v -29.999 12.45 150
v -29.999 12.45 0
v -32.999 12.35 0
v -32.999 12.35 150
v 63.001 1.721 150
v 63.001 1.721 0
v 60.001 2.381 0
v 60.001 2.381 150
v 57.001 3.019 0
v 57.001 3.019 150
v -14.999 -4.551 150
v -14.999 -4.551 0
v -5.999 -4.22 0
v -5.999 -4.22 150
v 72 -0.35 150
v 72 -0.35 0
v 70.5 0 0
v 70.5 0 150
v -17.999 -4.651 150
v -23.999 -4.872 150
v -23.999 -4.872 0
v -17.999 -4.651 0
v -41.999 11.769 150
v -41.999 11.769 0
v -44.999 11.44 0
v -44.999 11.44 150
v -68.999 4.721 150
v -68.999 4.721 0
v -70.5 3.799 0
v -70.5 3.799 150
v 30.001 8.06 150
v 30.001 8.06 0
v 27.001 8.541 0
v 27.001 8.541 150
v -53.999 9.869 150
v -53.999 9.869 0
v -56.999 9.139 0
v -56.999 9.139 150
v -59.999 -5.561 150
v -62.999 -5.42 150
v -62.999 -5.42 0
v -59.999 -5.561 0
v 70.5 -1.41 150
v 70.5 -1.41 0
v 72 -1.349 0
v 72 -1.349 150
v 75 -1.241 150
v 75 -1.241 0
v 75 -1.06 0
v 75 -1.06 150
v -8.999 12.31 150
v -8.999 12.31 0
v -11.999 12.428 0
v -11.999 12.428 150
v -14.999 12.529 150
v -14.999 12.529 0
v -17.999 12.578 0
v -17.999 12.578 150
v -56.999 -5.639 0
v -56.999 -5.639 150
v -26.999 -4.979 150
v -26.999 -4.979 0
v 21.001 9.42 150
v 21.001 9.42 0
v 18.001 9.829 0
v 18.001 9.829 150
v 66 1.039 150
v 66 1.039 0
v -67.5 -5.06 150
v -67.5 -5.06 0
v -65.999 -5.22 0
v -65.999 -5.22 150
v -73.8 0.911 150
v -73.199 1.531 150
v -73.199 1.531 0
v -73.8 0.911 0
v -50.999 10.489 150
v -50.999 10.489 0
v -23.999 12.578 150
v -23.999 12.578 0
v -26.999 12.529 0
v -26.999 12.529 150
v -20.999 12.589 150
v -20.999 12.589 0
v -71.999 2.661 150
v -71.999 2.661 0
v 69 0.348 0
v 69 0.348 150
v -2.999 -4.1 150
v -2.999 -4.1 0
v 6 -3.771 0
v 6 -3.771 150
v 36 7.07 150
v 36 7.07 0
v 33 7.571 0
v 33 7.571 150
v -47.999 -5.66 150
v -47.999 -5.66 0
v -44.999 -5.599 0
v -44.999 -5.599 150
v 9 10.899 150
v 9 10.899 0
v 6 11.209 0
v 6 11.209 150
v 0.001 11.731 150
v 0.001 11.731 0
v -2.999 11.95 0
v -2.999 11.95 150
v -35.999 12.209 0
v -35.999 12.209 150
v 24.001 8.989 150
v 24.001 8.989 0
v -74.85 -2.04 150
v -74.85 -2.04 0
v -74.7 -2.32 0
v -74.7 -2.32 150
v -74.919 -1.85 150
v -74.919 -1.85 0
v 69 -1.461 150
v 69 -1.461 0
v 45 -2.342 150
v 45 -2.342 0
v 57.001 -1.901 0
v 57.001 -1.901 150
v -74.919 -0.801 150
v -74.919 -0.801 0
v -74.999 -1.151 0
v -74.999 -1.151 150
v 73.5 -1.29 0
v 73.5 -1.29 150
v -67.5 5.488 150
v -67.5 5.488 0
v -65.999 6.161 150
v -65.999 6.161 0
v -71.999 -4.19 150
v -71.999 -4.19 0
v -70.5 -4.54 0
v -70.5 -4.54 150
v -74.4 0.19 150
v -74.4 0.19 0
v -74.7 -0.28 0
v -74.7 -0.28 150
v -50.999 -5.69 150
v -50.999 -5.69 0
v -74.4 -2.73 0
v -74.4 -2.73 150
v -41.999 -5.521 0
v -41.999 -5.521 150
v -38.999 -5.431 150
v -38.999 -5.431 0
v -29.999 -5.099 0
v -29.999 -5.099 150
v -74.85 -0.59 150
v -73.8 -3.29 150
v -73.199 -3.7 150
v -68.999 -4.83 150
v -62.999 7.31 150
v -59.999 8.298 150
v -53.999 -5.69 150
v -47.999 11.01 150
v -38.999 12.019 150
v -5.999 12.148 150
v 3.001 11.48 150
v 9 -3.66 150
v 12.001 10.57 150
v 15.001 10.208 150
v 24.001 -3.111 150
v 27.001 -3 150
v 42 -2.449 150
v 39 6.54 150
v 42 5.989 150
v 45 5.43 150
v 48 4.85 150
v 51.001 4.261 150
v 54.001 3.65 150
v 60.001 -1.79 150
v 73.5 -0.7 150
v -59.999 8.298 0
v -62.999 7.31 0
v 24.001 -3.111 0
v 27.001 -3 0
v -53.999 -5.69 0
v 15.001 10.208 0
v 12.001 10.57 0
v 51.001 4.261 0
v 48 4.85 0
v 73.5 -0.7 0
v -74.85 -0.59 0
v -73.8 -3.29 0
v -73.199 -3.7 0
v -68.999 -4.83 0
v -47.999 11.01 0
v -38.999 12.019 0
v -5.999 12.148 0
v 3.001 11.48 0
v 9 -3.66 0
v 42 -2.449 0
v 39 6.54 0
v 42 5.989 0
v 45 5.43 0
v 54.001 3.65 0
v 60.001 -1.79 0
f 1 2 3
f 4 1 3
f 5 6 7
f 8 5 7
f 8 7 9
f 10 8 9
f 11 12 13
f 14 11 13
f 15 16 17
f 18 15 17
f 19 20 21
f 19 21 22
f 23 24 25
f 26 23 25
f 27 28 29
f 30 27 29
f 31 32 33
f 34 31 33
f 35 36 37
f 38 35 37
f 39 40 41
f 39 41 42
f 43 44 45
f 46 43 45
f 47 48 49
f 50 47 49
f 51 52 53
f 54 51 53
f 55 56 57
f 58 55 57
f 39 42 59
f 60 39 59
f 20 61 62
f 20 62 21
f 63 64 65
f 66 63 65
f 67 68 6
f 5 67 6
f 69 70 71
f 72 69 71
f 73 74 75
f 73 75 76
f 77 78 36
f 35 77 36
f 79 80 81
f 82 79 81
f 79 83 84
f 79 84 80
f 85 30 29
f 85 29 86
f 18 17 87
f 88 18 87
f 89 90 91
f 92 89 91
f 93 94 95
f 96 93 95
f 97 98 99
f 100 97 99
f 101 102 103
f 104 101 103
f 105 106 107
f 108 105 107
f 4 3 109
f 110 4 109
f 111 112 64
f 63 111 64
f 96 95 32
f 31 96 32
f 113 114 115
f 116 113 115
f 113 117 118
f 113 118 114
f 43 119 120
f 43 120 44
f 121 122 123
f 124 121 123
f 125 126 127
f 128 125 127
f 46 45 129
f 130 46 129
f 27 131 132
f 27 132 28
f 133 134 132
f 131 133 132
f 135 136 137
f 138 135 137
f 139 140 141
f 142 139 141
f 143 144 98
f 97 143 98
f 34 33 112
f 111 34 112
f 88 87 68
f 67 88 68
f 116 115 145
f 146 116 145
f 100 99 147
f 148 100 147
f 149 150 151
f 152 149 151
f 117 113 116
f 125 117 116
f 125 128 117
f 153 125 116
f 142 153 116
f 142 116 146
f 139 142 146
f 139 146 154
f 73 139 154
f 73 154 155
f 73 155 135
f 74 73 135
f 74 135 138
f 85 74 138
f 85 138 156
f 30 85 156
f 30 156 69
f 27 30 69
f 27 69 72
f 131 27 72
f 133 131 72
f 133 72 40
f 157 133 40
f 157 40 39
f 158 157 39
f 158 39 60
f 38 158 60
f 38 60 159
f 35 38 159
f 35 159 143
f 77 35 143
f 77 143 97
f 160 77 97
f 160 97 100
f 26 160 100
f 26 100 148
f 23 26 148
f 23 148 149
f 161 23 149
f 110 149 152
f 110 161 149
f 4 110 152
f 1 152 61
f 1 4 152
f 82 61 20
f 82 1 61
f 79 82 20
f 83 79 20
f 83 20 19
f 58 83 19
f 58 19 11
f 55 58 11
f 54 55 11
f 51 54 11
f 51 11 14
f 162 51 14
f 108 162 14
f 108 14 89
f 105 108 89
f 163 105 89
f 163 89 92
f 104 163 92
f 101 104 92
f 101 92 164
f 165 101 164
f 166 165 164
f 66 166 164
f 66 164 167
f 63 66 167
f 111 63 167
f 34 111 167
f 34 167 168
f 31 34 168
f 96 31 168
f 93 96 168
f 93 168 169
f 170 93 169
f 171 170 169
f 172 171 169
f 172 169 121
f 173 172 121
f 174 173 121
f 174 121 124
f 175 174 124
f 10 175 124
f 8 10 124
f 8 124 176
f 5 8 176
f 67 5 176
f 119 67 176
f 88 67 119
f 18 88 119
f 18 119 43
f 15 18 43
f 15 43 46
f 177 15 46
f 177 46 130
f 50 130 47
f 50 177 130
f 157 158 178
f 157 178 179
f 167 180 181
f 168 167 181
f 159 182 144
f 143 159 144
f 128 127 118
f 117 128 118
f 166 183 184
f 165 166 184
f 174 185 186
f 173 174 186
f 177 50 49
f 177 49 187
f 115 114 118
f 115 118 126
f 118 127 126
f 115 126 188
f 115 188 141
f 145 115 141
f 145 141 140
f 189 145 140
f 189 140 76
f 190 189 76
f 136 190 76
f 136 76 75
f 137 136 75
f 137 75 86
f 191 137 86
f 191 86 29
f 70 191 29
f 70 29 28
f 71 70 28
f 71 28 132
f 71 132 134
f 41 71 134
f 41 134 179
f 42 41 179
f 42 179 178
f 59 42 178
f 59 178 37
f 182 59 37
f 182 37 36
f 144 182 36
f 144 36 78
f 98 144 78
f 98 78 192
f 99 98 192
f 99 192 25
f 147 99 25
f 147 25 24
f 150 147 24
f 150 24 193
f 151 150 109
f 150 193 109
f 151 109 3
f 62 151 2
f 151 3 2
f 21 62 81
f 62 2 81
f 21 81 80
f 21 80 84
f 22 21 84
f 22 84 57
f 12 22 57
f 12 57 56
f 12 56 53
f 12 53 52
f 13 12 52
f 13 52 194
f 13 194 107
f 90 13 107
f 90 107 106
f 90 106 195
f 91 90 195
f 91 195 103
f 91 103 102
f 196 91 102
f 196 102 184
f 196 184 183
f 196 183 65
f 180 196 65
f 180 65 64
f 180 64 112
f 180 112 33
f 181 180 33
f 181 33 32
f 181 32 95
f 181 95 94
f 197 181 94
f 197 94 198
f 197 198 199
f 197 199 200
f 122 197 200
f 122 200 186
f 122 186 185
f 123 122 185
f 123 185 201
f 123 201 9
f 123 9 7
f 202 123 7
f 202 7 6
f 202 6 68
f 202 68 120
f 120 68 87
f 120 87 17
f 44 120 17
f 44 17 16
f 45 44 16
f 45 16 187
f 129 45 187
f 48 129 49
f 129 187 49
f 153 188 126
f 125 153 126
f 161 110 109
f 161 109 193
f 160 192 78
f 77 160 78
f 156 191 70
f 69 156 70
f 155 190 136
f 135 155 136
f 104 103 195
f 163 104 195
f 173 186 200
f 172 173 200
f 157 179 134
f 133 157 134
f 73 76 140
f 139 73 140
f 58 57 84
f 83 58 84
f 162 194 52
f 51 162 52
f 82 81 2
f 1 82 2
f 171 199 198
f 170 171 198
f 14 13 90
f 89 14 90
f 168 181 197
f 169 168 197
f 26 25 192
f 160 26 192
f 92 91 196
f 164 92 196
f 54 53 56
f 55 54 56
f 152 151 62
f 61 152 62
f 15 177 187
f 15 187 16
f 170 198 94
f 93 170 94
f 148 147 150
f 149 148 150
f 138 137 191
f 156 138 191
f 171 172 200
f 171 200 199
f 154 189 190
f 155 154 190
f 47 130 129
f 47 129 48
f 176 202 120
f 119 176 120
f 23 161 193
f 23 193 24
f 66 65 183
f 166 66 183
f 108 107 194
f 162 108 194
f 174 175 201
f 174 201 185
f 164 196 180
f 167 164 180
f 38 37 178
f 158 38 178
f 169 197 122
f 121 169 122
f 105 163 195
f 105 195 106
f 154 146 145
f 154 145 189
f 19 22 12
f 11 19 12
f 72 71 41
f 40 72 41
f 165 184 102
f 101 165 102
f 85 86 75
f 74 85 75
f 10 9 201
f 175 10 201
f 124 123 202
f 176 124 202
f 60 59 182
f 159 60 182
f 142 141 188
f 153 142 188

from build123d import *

# Parameters (mm, degrees)
F1_DEPTH = 150


with BuildPart() as f1:
    # F0 (on Top) → F1 (new body)
    with BuildSketch(Plane.XY):
        Polygon((75.000358, -1.240587), (75.000358, -1.060069), (73.499726, -0.700405), (72.000364, -0.350393), (70.499732, -0.000356), (69.00037, 0.348285), (66.000376, 1.038682), (63.000636, 1.720825), (60.000642, 2.380894), (57.000648, 3.018917), (54.000654, 3.650082), (51.00066, 4.26052), (48.000412, 4.850333), (45.000418, 5.430495), (42.000424, 5.988609), (39.00043, 6.539814), (36.000436, 7.070369), (33.000442, 7.570597), (30.000702, 8.059801), (27.000708, 8.540775), (24.000714, 8.988577), (21.00072, 9.419869), (18.000726, 9.829317), (15.000732, 10.208031), (12.000738, 10.570489), (9.00049, 10.898657), (6.000496, 11.208537), (3.000502, 11.480063), (0.000508, 11.730761), (-2.999232, 11.949963), (-5.999226, 12.148337), (-8.99922, 12.309627), (-11.999214, 12.428245), (-14.999208, 12.528829), (-17.999202, 12.578359), (-20.999196, 12.589281), (-23.99919, 12.578359), (-26.999438, 12.528829), (-29.999432, 12.450343), (-32.998918, 12.349505), (-35.999166, 12.209043), (-38.99916, 12.018797), (-41.999154, 11.769369), (-44.999148, 11.440185), (-47.999142, 11.010163), (-50.999136, 10.489209), (-53.99913, 9.869195), (-56.999099, 9.138691), (-59.999118, 8.298205), (-62.999087, 7.310145), (-65.999081, 6.160872), (-67.499763, 5.488381), (-68.999075, 4.720793), (-70.499757, 3.798875), (-71.999069, 2.66065), (-73.19932, 1.530655), (-73.800132, 0.910514), (-74.399597, 0.18984), (-74.700003, -0.280111), (-74.850219, -0.590169), (-74.919103, -0.800989), (-74.999037, -1.151001), (-74.919103, -1.849679), (-74.850219, -2.039823), (-74.700003, -2.319579), (-74.399597, -2.730246), (-73.800132, -3.289732), (-73.19932, -3.700399), (-71.999069, -4.189603), (-70.499757, -4.539615), (-68.999075, -4.830369), (-67.499763, -5.060493), (-65.999081, -5.220386), (-62.999087, -5.420182), (-59.999118, -5.56072), (-56.999099, -5.639308), (-53.99913, -5.69026), (-50.999136, -5.69026), (-47.999142, -5.659958), (-44.999148, -5.599328), (-41.999154, -5.520766), (-38.99916, -5.43118), (-29.999432, -5.099101), (-26.999438, -4.979213), (-23.99919, -4.87172), (-17.999202, -4.651248), (-14.999208, -4.550613), (-11.999214, -4.440377), (-5.999226, -4.219905), (-2.999232, -4.100017), (6.000496, -3.770655), (9.00049, -3.660419), (24.000714, -3.110586), (27.000708, -3.00035), (42.000424, -2.449119), (45.000418, -2.341626), (57.000648, -1.900657), (60.000642, -1.790421), (69.00037, -1.461059), (70.499732, -1.410081), (72.000364, -1.349451), (73.499726, -1.290193), align=None)
    extrude(amount=F1_DEPTH)


solid = f1.part
